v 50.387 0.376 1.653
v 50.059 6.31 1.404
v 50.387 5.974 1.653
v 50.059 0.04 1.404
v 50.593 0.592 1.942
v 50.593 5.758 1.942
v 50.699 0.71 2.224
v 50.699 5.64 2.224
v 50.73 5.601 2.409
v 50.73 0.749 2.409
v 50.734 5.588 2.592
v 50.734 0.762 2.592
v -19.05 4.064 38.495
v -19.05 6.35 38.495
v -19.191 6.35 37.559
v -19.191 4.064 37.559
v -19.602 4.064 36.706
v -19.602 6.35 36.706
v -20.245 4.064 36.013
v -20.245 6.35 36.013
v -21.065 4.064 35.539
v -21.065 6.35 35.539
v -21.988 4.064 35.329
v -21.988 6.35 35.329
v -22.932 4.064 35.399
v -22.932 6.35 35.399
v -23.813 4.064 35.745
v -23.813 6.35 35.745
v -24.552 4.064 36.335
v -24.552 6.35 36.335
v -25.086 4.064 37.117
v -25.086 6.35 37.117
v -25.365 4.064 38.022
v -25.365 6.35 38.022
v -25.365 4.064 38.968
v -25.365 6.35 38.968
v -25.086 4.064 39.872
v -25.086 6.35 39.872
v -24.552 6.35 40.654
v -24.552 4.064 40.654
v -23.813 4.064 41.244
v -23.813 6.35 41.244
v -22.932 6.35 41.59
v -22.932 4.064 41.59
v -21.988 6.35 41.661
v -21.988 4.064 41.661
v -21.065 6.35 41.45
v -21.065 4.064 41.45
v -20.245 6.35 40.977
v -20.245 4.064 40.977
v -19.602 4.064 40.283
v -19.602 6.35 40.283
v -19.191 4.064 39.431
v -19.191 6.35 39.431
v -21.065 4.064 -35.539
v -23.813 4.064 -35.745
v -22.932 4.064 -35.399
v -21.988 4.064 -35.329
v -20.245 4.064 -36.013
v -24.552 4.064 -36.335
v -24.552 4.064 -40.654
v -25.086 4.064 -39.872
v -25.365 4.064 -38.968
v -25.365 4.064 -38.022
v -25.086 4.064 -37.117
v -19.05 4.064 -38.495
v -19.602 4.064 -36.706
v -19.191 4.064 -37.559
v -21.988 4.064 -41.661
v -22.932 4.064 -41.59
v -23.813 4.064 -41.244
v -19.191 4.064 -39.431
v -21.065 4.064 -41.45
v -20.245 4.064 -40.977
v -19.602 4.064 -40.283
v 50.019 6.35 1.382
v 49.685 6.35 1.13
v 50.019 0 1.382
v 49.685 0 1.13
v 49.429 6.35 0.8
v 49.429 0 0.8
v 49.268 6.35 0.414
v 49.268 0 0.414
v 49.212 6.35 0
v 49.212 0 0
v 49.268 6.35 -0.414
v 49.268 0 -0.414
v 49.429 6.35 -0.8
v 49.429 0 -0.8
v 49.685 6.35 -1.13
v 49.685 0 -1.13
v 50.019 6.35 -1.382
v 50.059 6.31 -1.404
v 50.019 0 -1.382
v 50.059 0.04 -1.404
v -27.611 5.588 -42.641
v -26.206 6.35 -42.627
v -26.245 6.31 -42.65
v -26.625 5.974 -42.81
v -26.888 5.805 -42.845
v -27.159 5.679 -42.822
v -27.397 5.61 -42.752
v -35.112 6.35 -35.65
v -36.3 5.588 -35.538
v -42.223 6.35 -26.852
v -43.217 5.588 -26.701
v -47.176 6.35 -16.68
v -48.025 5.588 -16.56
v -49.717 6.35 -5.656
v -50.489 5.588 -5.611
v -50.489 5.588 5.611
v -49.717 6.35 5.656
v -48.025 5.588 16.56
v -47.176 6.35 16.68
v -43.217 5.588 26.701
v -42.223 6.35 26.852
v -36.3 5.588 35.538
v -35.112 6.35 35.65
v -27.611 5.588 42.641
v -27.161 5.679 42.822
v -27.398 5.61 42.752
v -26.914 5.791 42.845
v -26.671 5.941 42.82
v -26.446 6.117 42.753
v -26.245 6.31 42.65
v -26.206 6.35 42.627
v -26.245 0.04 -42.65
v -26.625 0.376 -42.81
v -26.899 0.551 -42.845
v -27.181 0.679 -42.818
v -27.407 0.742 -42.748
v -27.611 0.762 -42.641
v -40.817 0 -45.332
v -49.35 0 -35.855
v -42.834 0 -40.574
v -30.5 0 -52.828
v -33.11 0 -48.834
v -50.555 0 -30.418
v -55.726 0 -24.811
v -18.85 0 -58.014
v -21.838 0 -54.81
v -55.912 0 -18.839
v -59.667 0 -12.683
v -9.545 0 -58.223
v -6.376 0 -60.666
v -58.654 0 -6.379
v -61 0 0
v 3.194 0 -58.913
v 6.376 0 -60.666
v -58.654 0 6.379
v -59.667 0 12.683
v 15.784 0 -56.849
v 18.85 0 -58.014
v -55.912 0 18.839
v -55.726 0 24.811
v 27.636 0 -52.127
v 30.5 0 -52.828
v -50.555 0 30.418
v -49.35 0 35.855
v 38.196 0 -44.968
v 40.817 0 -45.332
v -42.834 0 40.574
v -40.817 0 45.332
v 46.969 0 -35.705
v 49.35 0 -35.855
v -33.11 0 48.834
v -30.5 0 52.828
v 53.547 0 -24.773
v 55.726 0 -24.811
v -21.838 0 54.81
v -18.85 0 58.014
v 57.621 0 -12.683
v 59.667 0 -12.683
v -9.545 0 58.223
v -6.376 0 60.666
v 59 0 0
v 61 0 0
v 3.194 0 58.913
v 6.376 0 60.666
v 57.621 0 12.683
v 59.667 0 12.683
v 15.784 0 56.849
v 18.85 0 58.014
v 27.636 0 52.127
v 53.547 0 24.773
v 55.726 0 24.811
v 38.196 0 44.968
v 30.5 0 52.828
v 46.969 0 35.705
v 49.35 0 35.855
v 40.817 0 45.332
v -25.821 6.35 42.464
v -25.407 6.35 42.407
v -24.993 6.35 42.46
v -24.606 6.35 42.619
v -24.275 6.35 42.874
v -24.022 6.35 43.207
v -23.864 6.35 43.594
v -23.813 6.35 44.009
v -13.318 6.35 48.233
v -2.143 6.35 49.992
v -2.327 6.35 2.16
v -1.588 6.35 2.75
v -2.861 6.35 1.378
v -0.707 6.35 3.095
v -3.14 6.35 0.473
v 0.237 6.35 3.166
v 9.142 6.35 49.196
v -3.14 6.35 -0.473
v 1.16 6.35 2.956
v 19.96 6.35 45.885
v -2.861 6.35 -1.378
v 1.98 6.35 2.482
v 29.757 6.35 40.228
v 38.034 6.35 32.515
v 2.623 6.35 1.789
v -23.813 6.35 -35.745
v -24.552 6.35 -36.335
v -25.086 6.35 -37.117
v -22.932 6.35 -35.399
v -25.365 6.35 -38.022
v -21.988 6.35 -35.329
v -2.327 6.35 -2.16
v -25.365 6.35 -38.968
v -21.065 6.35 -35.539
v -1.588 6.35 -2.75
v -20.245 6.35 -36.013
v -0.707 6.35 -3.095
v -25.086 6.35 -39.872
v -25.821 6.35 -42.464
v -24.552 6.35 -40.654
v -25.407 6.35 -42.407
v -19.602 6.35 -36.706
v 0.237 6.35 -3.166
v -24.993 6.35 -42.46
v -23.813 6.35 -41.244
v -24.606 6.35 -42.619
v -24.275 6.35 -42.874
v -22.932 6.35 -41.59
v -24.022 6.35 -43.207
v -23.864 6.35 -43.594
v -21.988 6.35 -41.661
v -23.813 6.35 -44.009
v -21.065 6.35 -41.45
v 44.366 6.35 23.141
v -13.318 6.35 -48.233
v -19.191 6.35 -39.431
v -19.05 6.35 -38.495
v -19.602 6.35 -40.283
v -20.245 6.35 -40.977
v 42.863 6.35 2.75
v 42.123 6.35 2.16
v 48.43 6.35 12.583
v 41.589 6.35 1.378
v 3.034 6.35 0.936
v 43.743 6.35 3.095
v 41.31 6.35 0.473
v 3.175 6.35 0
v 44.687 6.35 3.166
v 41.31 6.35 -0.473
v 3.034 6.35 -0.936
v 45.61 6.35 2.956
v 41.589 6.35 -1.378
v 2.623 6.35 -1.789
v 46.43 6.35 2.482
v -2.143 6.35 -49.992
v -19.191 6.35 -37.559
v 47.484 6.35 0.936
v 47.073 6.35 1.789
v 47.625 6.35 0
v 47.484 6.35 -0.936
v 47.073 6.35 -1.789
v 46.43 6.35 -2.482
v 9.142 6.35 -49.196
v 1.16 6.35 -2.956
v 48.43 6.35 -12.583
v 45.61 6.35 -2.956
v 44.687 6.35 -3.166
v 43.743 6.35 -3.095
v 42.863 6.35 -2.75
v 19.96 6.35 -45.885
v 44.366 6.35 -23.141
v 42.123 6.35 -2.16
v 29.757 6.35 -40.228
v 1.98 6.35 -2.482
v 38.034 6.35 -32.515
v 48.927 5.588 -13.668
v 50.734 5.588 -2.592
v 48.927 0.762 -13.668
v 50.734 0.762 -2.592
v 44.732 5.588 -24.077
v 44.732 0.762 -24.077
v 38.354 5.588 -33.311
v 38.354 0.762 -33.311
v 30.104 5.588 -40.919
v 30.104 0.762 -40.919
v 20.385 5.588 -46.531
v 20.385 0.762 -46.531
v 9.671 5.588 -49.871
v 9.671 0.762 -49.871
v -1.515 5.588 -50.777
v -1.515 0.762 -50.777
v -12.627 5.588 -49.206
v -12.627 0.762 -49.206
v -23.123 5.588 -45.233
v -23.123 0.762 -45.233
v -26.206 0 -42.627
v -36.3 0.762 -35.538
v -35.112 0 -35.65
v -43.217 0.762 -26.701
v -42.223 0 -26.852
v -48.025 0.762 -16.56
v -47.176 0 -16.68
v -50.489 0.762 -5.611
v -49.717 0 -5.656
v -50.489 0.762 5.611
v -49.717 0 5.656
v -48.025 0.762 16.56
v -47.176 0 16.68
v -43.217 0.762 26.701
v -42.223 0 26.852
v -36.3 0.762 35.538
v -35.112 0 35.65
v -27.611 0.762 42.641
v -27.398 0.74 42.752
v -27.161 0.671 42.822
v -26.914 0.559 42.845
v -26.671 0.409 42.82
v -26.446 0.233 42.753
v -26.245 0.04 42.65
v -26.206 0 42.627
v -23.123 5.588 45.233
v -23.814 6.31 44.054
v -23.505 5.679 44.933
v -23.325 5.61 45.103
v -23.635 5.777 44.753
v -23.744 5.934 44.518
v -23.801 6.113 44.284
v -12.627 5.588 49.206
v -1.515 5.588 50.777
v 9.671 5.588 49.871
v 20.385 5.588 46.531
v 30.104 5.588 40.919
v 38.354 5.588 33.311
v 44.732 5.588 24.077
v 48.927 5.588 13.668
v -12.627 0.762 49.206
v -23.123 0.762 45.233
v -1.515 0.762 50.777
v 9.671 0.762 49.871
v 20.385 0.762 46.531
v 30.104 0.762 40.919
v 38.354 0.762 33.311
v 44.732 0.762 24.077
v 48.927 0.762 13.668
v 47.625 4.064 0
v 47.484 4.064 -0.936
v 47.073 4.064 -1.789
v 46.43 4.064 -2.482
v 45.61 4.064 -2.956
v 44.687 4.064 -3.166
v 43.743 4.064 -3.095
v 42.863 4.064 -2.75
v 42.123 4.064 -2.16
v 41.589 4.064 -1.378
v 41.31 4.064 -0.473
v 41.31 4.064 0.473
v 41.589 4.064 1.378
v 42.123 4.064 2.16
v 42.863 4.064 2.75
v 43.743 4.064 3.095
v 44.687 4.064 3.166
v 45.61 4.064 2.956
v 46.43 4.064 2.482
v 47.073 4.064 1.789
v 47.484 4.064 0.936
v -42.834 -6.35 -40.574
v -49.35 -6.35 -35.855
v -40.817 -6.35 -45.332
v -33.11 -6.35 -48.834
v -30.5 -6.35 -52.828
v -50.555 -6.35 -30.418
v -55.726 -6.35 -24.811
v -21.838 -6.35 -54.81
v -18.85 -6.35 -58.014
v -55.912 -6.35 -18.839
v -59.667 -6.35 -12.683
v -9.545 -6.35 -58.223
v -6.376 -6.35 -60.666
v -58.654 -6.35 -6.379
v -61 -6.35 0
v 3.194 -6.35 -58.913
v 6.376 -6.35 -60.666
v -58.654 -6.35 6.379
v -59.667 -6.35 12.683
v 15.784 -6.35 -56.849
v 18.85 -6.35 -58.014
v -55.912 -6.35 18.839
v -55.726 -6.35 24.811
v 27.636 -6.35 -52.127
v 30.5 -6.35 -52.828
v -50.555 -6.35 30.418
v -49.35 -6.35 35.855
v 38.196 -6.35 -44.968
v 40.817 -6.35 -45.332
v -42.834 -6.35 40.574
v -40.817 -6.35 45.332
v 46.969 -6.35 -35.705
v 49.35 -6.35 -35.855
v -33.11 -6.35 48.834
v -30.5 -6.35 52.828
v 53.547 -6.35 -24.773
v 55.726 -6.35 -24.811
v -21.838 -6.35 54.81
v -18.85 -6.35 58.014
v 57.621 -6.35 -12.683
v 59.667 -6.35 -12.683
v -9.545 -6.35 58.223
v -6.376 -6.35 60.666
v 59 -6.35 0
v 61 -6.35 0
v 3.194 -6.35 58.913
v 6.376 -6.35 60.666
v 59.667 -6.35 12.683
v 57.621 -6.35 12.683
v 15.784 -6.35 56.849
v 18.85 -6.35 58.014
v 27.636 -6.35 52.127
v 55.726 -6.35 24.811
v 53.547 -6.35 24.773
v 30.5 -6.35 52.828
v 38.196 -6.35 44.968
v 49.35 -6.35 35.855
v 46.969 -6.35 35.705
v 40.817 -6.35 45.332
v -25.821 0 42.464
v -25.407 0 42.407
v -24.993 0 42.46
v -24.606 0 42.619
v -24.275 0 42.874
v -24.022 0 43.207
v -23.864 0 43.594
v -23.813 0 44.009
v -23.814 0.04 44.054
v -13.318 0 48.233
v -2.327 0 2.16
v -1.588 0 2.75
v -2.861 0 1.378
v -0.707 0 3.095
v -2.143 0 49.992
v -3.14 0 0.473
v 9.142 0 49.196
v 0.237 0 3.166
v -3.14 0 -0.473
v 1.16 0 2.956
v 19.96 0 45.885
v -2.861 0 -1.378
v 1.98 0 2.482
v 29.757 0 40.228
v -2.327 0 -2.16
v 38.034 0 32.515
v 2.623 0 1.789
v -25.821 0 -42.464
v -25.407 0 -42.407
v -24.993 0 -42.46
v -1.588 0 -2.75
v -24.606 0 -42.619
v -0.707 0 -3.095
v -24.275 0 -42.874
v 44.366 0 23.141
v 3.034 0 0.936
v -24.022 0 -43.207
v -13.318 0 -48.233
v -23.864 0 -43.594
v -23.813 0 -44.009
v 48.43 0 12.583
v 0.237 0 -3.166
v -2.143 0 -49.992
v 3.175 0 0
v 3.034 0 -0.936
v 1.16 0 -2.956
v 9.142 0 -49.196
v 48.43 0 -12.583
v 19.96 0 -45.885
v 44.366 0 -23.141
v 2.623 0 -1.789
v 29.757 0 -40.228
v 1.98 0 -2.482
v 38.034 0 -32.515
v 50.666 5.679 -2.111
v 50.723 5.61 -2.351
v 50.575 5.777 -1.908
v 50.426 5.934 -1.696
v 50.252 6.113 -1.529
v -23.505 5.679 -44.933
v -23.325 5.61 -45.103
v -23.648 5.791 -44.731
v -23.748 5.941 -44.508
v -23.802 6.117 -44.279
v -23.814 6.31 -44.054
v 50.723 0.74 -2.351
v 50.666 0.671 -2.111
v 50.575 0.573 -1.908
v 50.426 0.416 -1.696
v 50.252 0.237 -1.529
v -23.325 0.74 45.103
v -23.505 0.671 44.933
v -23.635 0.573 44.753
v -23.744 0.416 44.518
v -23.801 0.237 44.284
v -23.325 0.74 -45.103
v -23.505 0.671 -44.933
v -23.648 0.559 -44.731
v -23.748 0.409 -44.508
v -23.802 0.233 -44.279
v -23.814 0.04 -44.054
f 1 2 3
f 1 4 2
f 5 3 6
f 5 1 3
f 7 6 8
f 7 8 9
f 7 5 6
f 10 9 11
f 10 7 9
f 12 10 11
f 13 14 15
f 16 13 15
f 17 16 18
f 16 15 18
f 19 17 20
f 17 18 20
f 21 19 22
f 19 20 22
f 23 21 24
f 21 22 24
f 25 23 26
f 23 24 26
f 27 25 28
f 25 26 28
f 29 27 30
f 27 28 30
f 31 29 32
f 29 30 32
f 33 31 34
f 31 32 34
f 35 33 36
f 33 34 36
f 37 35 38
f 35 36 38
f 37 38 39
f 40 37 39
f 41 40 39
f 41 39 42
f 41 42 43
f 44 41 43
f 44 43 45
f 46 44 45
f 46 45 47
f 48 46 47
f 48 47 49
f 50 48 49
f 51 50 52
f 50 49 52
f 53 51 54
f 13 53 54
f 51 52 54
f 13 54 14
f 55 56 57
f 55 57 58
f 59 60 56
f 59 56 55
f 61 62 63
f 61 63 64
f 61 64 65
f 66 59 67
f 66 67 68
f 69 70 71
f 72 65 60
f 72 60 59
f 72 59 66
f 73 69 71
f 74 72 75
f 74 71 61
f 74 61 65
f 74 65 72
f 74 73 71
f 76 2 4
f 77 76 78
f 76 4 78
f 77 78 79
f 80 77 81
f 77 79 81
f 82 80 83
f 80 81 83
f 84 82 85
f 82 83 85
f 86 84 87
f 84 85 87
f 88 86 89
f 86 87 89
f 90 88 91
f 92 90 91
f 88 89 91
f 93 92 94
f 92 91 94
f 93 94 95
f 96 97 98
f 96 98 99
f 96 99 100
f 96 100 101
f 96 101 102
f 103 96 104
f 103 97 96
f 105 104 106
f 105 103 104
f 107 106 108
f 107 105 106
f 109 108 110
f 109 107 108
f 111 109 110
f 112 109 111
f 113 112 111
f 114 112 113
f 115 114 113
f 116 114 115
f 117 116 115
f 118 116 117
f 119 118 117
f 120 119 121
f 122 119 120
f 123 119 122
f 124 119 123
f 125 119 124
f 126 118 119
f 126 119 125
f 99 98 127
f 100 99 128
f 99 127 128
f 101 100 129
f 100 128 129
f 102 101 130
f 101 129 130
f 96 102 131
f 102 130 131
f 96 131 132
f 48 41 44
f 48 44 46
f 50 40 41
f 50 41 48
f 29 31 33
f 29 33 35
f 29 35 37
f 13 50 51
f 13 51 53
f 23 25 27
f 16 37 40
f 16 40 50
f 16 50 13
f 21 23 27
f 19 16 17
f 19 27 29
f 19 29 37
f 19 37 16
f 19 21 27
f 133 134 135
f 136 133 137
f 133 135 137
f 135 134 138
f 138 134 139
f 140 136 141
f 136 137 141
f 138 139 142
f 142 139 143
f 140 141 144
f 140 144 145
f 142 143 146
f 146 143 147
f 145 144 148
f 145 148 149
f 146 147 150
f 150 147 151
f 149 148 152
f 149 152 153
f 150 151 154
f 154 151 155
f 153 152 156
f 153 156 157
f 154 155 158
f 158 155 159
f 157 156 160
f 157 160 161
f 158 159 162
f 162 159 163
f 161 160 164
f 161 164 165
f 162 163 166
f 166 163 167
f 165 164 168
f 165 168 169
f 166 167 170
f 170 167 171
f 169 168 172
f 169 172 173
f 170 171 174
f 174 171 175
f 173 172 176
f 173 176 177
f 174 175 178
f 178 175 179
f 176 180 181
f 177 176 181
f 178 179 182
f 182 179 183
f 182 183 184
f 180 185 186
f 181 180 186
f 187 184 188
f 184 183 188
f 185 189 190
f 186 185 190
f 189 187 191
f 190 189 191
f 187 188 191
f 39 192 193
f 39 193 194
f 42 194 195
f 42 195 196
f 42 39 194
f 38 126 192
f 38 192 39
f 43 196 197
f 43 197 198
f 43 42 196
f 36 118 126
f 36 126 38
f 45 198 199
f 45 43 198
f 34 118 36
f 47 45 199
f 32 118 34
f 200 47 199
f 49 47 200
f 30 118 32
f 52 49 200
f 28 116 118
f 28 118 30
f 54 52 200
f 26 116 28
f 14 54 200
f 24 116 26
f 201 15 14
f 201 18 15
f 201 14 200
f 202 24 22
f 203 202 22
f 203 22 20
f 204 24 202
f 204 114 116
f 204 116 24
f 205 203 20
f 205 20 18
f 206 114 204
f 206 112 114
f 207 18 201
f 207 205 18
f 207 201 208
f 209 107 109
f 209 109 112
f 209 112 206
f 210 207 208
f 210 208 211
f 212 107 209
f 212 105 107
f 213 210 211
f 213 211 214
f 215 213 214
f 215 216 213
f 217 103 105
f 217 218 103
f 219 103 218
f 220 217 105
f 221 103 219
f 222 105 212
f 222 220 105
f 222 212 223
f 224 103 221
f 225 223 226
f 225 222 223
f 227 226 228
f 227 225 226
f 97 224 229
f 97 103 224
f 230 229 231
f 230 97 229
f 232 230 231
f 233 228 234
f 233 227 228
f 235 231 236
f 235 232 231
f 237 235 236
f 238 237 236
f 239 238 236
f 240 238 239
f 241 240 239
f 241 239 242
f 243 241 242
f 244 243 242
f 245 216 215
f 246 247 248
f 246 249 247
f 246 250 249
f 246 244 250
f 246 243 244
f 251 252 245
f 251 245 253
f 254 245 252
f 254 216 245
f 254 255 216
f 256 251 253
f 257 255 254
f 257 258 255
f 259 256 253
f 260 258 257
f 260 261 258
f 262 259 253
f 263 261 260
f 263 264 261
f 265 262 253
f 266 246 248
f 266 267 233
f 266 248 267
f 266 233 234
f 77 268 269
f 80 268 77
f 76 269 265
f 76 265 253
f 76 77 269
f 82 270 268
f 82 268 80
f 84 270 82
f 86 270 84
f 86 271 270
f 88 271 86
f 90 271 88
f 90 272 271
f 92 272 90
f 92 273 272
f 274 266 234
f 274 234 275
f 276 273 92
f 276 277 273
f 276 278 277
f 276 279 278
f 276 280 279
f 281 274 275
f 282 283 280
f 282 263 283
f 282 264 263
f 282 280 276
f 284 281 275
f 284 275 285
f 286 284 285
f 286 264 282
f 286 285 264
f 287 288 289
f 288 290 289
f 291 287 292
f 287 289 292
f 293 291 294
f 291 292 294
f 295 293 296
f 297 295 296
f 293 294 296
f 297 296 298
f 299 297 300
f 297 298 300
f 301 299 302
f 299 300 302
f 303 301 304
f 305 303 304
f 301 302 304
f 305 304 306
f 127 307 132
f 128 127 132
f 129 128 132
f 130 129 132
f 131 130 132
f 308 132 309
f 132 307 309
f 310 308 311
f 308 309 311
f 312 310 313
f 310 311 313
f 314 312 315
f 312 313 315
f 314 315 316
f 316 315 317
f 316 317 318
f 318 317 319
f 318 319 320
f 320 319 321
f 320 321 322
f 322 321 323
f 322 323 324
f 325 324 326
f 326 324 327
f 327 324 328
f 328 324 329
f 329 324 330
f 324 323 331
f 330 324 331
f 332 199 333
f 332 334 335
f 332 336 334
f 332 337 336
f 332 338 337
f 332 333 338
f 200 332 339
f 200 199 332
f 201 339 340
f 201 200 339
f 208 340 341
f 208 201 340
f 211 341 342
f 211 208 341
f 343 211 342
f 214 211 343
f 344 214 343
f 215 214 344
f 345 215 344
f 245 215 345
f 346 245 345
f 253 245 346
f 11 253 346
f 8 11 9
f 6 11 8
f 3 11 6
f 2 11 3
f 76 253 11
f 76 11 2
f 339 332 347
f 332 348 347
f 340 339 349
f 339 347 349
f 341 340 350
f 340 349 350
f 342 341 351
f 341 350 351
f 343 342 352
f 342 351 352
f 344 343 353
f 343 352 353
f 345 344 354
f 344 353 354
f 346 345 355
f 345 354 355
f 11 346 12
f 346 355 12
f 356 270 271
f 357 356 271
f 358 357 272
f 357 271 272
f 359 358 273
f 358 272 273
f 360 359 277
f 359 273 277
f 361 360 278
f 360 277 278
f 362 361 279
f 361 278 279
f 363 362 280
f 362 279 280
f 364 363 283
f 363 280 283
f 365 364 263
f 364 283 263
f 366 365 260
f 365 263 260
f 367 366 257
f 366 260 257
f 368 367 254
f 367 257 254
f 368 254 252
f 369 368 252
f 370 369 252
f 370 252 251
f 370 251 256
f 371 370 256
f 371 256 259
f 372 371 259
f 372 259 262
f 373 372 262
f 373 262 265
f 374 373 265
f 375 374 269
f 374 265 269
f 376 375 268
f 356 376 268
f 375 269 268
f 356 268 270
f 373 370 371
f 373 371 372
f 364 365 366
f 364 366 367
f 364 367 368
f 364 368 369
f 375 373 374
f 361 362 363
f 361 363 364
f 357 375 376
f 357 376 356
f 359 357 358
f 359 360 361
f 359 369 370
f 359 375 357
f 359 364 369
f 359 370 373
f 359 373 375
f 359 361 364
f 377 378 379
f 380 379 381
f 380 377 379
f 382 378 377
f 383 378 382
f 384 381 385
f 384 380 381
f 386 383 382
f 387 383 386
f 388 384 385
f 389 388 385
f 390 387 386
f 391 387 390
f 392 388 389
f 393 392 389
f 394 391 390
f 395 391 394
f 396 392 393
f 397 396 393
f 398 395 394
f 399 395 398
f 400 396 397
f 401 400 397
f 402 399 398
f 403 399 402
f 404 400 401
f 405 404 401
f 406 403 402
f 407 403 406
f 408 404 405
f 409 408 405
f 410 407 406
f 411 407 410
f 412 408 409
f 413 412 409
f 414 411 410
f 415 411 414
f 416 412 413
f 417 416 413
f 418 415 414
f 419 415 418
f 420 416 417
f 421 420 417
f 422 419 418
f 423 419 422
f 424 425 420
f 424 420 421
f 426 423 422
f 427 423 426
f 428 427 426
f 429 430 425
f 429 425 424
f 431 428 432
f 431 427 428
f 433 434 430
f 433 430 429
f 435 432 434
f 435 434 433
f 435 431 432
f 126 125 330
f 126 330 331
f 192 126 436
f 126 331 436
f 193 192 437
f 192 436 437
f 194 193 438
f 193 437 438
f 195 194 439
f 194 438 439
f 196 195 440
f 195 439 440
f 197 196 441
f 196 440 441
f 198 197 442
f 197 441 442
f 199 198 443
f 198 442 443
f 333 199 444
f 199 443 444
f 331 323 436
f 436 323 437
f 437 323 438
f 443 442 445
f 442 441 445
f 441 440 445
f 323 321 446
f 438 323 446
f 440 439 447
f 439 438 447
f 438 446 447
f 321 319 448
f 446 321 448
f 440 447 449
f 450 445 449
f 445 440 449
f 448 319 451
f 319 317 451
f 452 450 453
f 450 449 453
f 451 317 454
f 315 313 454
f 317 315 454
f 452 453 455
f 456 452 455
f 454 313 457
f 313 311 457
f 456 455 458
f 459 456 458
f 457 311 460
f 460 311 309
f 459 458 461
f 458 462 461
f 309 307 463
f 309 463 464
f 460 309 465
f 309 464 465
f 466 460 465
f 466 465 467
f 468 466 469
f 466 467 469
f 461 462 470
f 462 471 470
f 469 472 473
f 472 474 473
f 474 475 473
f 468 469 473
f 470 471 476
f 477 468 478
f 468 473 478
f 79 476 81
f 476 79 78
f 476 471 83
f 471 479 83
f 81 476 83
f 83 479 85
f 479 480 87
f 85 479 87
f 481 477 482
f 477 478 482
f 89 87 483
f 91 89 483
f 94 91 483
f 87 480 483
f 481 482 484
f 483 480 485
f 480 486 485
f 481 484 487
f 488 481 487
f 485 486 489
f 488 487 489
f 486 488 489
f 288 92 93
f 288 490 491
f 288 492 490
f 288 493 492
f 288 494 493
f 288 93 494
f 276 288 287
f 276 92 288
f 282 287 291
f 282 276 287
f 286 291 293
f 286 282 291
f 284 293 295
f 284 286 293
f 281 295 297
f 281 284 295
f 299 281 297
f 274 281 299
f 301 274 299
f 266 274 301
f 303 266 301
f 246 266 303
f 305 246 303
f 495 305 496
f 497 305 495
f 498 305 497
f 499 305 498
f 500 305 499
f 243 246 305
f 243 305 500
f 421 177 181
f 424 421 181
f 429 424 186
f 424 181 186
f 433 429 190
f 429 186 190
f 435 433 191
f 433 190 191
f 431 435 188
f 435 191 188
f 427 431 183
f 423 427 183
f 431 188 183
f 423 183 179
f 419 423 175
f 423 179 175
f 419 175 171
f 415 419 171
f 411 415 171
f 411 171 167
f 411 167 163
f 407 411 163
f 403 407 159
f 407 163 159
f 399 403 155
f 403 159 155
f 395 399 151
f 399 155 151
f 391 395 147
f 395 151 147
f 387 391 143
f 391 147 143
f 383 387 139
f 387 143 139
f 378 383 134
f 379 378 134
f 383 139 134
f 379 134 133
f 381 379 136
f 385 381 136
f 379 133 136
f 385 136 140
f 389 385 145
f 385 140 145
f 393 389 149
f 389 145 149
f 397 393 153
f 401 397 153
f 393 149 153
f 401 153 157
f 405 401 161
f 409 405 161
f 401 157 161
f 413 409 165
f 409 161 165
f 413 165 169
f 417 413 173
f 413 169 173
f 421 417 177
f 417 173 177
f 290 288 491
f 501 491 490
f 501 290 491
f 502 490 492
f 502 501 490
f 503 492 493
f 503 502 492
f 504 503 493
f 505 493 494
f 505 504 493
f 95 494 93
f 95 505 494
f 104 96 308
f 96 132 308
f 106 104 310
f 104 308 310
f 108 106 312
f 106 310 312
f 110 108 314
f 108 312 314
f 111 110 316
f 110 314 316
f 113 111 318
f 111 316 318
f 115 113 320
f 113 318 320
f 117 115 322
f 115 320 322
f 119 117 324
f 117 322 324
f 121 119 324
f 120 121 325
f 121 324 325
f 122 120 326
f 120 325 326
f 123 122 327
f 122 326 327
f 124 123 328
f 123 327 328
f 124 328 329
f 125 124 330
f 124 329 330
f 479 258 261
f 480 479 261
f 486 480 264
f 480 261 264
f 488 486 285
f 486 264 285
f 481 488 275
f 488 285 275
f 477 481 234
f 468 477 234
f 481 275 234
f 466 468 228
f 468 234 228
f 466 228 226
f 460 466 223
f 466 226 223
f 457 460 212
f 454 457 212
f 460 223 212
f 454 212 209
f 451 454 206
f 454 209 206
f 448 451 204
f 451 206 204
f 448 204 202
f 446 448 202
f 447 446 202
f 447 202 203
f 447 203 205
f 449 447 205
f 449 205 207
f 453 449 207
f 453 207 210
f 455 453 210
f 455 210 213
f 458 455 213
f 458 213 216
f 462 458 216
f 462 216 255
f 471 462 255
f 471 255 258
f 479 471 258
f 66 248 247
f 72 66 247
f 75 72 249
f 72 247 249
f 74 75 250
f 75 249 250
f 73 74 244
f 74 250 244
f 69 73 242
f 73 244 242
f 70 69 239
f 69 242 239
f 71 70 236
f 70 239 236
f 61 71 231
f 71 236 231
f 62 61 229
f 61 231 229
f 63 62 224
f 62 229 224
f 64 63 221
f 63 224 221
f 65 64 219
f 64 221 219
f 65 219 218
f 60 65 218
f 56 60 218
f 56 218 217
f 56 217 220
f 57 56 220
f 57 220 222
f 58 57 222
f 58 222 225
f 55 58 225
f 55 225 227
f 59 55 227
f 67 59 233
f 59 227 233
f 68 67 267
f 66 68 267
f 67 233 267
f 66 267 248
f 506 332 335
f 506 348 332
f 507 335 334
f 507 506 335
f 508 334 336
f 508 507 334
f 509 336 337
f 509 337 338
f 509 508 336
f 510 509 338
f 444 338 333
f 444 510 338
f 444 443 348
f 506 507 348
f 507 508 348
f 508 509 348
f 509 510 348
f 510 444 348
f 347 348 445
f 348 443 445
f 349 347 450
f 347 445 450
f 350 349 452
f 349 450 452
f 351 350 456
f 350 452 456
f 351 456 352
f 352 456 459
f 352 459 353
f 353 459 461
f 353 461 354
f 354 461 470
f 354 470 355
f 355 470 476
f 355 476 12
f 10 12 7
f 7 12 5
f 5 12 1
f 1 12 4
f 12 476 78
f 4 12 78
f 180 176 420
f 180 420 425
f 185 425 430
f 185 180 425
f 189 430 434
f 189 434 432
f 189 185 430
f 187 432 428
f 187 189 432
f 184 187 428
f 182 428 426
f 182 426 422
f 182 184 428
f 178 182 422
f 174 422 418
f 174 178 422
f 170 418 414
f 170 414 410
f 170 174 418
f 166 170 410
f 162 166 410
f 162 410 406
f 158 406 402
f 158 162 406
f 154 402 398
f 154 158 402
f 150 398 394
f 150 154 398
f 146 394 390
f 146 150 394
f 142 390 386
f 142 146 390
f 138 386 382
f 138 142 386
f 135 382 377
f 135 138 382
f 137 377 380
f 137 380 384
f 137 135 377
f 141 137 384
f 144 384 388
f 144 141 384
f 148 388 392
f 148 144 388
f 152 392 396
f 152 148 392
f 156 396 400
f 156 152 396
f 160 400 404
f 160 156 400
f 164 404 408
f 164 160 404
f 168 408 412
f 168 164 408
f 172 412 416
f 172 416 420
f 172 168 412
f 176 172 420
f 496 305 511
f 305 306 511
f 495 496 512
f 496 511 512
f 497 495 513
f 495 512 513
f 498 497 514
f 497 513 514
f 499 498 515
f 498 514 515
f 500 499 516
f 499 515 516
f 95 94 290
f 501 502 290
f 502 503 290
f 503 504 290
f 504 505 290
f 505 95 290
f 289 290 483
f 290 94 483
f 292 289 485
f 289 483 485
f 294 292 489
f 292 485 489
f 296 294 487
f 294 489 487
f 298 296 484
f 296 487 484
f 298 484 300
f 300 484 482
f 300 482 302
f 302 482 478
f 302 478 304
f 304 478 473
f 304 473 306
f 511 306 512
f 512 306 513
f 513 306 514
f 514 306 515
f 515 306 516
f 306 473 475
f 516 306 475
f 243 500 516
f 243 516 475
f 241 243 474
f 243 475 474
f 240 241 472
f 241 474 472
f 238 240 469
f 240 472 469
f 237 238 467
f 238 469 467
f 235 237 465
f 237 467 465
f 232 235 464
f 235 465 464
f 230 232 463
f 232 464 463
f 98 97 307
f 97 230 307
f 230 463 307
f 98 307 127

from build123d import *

# Parameters (mm, degrees)
SKETCH1_R               = 50.8
BOSS_EXTRUDE1_DEPTH     = 6.35
SKETCH2_R               = 3.175
CUT_EXTRUDE1_DEPTH      = 2.286
SKETCH3_R               = 3.175
CUT_EXTRUDE2_DEPTH      = 1
CUT_EXTRUDE2_DEPTH_BACK = 7.35
SKETCH4_R               = 1.5875
CUT_EXTRUDE3_DEPTH      = 7.35
CHAMFER1_SIZE           = 0.762
FILLET1_R               = 1.27
SKETCH5_R               = 61
SKETCH5_R_2             = 59
BOSS_EXTRUDE2_DEPTH     = 6.35


with BuildPart() as part:
    # Sketch1 → Boss-Extrude1 (new body)
    with BuildSketch(Plane(origin=(0, 0, 0), x_dir=(1, 0, 0), z_dir=(0, 1, 0))):
        Circle(SKETCH1_R)
    extrude(amount=BOSS_EXTRUDE1_DEPTH)

    # Sketch2 → Cut-Extrude1 (cut)
    with BuildSketch(Plane(origin=(0, 6.35, 0), x_dir=(1, 0, 0), z_dir=(0, 1, 0))):
        with Locations((-22.225, -38.494829198)):
            Circle(SKETCH2_R)
        with Locations((-22.225, 38.494829198)):
            Circle(SKETCH2_R)
        with Locations((44.45, 0)):
            Circle(SKETCH2_R)
    extrude(amount=-CUT_EXTRUDE1_DEPTH, mode=Mode.SUBTRACT)

    # Sketch3 → Cut-Extrude2 (cut, two sides)
    with BuildSketch(Plane(origin=(0, 6.35, 0), x_dir=(1, 0, 0), z_dir=(0, 1, 0))) as cut_extrude2_sk:
        Circle(SKETCH3_R)
    extrude(amount=CUT_EXTRUDE2_DEPTH, mode=Mode.SUBTRACT)
    extrude(cut_extrude2_sk.sketch, amount=-CUT_EXTRUDE2_DEPTH_BACK, mode=Mode.SUBTRACT)

    # Sketch4 → Cut-Extrude3 (cut, through all)
    with BuildSketch(Plane.XZ):
        with Locations((50.8, 0)):
            Circle(SKETCH4_R)
        with Locations((-25.4, 43.994090512)):
            Circle(SKETCH4_R)
        with Locations((-25.4, -43.994090512)):
            Circle(SKETCH4_R)
    extrude(amount=-CUT_EXTRUDE3_DEPTH, mode=Mode.SUBTRACT)

    # Chamfer1
    chamfer1_edges = [part.edges().sort_by_distance(p)[0] for p in [
        (25.4, 0, -43.994090512),
        (-50.8, 0, 0),
        (25.4, 0, 43.994090512),
        (25.4, 6.35, -43.994090512),
        (-50.8, 6.35, 0),
        (25.4, 6.35, 43.994090512),
    ]]
    chamfer(chamfer1_edges, length=CHAMFER1_SIZE)

    # Fillet1
    fillet1_edges = [part.edges().sort_by_distance(p)[0] for p in [
        (-24.012950162, 3.175, 44.766262124),
        (-26.76224515, 3.175, 43.178955922),
        (50.775195313, 3.175, -1.587306202),
        (50.775195313, 3.175, 1.587306202),
        (-24.012950162, 3.175, -44.766262124),
        (-26.76224515, 3.175, -43.178955922),
    ]]
    fillet(fillet1_edges, radius=FILLET1_R)


with BuildPart() as body_2:
    # Sketch5 → Boss-Extrude2 (new body)
    with BuildSketch(Plane.XZ):
        Circle(SKETCH5_R)
        Circle(SKETCH5_R_2, mode=Mode.SUBTRACT)
    extrude(amount=BOSS_EXTRUDE2_DEPTH)


solid = Compound([part.part, body_2.part])
